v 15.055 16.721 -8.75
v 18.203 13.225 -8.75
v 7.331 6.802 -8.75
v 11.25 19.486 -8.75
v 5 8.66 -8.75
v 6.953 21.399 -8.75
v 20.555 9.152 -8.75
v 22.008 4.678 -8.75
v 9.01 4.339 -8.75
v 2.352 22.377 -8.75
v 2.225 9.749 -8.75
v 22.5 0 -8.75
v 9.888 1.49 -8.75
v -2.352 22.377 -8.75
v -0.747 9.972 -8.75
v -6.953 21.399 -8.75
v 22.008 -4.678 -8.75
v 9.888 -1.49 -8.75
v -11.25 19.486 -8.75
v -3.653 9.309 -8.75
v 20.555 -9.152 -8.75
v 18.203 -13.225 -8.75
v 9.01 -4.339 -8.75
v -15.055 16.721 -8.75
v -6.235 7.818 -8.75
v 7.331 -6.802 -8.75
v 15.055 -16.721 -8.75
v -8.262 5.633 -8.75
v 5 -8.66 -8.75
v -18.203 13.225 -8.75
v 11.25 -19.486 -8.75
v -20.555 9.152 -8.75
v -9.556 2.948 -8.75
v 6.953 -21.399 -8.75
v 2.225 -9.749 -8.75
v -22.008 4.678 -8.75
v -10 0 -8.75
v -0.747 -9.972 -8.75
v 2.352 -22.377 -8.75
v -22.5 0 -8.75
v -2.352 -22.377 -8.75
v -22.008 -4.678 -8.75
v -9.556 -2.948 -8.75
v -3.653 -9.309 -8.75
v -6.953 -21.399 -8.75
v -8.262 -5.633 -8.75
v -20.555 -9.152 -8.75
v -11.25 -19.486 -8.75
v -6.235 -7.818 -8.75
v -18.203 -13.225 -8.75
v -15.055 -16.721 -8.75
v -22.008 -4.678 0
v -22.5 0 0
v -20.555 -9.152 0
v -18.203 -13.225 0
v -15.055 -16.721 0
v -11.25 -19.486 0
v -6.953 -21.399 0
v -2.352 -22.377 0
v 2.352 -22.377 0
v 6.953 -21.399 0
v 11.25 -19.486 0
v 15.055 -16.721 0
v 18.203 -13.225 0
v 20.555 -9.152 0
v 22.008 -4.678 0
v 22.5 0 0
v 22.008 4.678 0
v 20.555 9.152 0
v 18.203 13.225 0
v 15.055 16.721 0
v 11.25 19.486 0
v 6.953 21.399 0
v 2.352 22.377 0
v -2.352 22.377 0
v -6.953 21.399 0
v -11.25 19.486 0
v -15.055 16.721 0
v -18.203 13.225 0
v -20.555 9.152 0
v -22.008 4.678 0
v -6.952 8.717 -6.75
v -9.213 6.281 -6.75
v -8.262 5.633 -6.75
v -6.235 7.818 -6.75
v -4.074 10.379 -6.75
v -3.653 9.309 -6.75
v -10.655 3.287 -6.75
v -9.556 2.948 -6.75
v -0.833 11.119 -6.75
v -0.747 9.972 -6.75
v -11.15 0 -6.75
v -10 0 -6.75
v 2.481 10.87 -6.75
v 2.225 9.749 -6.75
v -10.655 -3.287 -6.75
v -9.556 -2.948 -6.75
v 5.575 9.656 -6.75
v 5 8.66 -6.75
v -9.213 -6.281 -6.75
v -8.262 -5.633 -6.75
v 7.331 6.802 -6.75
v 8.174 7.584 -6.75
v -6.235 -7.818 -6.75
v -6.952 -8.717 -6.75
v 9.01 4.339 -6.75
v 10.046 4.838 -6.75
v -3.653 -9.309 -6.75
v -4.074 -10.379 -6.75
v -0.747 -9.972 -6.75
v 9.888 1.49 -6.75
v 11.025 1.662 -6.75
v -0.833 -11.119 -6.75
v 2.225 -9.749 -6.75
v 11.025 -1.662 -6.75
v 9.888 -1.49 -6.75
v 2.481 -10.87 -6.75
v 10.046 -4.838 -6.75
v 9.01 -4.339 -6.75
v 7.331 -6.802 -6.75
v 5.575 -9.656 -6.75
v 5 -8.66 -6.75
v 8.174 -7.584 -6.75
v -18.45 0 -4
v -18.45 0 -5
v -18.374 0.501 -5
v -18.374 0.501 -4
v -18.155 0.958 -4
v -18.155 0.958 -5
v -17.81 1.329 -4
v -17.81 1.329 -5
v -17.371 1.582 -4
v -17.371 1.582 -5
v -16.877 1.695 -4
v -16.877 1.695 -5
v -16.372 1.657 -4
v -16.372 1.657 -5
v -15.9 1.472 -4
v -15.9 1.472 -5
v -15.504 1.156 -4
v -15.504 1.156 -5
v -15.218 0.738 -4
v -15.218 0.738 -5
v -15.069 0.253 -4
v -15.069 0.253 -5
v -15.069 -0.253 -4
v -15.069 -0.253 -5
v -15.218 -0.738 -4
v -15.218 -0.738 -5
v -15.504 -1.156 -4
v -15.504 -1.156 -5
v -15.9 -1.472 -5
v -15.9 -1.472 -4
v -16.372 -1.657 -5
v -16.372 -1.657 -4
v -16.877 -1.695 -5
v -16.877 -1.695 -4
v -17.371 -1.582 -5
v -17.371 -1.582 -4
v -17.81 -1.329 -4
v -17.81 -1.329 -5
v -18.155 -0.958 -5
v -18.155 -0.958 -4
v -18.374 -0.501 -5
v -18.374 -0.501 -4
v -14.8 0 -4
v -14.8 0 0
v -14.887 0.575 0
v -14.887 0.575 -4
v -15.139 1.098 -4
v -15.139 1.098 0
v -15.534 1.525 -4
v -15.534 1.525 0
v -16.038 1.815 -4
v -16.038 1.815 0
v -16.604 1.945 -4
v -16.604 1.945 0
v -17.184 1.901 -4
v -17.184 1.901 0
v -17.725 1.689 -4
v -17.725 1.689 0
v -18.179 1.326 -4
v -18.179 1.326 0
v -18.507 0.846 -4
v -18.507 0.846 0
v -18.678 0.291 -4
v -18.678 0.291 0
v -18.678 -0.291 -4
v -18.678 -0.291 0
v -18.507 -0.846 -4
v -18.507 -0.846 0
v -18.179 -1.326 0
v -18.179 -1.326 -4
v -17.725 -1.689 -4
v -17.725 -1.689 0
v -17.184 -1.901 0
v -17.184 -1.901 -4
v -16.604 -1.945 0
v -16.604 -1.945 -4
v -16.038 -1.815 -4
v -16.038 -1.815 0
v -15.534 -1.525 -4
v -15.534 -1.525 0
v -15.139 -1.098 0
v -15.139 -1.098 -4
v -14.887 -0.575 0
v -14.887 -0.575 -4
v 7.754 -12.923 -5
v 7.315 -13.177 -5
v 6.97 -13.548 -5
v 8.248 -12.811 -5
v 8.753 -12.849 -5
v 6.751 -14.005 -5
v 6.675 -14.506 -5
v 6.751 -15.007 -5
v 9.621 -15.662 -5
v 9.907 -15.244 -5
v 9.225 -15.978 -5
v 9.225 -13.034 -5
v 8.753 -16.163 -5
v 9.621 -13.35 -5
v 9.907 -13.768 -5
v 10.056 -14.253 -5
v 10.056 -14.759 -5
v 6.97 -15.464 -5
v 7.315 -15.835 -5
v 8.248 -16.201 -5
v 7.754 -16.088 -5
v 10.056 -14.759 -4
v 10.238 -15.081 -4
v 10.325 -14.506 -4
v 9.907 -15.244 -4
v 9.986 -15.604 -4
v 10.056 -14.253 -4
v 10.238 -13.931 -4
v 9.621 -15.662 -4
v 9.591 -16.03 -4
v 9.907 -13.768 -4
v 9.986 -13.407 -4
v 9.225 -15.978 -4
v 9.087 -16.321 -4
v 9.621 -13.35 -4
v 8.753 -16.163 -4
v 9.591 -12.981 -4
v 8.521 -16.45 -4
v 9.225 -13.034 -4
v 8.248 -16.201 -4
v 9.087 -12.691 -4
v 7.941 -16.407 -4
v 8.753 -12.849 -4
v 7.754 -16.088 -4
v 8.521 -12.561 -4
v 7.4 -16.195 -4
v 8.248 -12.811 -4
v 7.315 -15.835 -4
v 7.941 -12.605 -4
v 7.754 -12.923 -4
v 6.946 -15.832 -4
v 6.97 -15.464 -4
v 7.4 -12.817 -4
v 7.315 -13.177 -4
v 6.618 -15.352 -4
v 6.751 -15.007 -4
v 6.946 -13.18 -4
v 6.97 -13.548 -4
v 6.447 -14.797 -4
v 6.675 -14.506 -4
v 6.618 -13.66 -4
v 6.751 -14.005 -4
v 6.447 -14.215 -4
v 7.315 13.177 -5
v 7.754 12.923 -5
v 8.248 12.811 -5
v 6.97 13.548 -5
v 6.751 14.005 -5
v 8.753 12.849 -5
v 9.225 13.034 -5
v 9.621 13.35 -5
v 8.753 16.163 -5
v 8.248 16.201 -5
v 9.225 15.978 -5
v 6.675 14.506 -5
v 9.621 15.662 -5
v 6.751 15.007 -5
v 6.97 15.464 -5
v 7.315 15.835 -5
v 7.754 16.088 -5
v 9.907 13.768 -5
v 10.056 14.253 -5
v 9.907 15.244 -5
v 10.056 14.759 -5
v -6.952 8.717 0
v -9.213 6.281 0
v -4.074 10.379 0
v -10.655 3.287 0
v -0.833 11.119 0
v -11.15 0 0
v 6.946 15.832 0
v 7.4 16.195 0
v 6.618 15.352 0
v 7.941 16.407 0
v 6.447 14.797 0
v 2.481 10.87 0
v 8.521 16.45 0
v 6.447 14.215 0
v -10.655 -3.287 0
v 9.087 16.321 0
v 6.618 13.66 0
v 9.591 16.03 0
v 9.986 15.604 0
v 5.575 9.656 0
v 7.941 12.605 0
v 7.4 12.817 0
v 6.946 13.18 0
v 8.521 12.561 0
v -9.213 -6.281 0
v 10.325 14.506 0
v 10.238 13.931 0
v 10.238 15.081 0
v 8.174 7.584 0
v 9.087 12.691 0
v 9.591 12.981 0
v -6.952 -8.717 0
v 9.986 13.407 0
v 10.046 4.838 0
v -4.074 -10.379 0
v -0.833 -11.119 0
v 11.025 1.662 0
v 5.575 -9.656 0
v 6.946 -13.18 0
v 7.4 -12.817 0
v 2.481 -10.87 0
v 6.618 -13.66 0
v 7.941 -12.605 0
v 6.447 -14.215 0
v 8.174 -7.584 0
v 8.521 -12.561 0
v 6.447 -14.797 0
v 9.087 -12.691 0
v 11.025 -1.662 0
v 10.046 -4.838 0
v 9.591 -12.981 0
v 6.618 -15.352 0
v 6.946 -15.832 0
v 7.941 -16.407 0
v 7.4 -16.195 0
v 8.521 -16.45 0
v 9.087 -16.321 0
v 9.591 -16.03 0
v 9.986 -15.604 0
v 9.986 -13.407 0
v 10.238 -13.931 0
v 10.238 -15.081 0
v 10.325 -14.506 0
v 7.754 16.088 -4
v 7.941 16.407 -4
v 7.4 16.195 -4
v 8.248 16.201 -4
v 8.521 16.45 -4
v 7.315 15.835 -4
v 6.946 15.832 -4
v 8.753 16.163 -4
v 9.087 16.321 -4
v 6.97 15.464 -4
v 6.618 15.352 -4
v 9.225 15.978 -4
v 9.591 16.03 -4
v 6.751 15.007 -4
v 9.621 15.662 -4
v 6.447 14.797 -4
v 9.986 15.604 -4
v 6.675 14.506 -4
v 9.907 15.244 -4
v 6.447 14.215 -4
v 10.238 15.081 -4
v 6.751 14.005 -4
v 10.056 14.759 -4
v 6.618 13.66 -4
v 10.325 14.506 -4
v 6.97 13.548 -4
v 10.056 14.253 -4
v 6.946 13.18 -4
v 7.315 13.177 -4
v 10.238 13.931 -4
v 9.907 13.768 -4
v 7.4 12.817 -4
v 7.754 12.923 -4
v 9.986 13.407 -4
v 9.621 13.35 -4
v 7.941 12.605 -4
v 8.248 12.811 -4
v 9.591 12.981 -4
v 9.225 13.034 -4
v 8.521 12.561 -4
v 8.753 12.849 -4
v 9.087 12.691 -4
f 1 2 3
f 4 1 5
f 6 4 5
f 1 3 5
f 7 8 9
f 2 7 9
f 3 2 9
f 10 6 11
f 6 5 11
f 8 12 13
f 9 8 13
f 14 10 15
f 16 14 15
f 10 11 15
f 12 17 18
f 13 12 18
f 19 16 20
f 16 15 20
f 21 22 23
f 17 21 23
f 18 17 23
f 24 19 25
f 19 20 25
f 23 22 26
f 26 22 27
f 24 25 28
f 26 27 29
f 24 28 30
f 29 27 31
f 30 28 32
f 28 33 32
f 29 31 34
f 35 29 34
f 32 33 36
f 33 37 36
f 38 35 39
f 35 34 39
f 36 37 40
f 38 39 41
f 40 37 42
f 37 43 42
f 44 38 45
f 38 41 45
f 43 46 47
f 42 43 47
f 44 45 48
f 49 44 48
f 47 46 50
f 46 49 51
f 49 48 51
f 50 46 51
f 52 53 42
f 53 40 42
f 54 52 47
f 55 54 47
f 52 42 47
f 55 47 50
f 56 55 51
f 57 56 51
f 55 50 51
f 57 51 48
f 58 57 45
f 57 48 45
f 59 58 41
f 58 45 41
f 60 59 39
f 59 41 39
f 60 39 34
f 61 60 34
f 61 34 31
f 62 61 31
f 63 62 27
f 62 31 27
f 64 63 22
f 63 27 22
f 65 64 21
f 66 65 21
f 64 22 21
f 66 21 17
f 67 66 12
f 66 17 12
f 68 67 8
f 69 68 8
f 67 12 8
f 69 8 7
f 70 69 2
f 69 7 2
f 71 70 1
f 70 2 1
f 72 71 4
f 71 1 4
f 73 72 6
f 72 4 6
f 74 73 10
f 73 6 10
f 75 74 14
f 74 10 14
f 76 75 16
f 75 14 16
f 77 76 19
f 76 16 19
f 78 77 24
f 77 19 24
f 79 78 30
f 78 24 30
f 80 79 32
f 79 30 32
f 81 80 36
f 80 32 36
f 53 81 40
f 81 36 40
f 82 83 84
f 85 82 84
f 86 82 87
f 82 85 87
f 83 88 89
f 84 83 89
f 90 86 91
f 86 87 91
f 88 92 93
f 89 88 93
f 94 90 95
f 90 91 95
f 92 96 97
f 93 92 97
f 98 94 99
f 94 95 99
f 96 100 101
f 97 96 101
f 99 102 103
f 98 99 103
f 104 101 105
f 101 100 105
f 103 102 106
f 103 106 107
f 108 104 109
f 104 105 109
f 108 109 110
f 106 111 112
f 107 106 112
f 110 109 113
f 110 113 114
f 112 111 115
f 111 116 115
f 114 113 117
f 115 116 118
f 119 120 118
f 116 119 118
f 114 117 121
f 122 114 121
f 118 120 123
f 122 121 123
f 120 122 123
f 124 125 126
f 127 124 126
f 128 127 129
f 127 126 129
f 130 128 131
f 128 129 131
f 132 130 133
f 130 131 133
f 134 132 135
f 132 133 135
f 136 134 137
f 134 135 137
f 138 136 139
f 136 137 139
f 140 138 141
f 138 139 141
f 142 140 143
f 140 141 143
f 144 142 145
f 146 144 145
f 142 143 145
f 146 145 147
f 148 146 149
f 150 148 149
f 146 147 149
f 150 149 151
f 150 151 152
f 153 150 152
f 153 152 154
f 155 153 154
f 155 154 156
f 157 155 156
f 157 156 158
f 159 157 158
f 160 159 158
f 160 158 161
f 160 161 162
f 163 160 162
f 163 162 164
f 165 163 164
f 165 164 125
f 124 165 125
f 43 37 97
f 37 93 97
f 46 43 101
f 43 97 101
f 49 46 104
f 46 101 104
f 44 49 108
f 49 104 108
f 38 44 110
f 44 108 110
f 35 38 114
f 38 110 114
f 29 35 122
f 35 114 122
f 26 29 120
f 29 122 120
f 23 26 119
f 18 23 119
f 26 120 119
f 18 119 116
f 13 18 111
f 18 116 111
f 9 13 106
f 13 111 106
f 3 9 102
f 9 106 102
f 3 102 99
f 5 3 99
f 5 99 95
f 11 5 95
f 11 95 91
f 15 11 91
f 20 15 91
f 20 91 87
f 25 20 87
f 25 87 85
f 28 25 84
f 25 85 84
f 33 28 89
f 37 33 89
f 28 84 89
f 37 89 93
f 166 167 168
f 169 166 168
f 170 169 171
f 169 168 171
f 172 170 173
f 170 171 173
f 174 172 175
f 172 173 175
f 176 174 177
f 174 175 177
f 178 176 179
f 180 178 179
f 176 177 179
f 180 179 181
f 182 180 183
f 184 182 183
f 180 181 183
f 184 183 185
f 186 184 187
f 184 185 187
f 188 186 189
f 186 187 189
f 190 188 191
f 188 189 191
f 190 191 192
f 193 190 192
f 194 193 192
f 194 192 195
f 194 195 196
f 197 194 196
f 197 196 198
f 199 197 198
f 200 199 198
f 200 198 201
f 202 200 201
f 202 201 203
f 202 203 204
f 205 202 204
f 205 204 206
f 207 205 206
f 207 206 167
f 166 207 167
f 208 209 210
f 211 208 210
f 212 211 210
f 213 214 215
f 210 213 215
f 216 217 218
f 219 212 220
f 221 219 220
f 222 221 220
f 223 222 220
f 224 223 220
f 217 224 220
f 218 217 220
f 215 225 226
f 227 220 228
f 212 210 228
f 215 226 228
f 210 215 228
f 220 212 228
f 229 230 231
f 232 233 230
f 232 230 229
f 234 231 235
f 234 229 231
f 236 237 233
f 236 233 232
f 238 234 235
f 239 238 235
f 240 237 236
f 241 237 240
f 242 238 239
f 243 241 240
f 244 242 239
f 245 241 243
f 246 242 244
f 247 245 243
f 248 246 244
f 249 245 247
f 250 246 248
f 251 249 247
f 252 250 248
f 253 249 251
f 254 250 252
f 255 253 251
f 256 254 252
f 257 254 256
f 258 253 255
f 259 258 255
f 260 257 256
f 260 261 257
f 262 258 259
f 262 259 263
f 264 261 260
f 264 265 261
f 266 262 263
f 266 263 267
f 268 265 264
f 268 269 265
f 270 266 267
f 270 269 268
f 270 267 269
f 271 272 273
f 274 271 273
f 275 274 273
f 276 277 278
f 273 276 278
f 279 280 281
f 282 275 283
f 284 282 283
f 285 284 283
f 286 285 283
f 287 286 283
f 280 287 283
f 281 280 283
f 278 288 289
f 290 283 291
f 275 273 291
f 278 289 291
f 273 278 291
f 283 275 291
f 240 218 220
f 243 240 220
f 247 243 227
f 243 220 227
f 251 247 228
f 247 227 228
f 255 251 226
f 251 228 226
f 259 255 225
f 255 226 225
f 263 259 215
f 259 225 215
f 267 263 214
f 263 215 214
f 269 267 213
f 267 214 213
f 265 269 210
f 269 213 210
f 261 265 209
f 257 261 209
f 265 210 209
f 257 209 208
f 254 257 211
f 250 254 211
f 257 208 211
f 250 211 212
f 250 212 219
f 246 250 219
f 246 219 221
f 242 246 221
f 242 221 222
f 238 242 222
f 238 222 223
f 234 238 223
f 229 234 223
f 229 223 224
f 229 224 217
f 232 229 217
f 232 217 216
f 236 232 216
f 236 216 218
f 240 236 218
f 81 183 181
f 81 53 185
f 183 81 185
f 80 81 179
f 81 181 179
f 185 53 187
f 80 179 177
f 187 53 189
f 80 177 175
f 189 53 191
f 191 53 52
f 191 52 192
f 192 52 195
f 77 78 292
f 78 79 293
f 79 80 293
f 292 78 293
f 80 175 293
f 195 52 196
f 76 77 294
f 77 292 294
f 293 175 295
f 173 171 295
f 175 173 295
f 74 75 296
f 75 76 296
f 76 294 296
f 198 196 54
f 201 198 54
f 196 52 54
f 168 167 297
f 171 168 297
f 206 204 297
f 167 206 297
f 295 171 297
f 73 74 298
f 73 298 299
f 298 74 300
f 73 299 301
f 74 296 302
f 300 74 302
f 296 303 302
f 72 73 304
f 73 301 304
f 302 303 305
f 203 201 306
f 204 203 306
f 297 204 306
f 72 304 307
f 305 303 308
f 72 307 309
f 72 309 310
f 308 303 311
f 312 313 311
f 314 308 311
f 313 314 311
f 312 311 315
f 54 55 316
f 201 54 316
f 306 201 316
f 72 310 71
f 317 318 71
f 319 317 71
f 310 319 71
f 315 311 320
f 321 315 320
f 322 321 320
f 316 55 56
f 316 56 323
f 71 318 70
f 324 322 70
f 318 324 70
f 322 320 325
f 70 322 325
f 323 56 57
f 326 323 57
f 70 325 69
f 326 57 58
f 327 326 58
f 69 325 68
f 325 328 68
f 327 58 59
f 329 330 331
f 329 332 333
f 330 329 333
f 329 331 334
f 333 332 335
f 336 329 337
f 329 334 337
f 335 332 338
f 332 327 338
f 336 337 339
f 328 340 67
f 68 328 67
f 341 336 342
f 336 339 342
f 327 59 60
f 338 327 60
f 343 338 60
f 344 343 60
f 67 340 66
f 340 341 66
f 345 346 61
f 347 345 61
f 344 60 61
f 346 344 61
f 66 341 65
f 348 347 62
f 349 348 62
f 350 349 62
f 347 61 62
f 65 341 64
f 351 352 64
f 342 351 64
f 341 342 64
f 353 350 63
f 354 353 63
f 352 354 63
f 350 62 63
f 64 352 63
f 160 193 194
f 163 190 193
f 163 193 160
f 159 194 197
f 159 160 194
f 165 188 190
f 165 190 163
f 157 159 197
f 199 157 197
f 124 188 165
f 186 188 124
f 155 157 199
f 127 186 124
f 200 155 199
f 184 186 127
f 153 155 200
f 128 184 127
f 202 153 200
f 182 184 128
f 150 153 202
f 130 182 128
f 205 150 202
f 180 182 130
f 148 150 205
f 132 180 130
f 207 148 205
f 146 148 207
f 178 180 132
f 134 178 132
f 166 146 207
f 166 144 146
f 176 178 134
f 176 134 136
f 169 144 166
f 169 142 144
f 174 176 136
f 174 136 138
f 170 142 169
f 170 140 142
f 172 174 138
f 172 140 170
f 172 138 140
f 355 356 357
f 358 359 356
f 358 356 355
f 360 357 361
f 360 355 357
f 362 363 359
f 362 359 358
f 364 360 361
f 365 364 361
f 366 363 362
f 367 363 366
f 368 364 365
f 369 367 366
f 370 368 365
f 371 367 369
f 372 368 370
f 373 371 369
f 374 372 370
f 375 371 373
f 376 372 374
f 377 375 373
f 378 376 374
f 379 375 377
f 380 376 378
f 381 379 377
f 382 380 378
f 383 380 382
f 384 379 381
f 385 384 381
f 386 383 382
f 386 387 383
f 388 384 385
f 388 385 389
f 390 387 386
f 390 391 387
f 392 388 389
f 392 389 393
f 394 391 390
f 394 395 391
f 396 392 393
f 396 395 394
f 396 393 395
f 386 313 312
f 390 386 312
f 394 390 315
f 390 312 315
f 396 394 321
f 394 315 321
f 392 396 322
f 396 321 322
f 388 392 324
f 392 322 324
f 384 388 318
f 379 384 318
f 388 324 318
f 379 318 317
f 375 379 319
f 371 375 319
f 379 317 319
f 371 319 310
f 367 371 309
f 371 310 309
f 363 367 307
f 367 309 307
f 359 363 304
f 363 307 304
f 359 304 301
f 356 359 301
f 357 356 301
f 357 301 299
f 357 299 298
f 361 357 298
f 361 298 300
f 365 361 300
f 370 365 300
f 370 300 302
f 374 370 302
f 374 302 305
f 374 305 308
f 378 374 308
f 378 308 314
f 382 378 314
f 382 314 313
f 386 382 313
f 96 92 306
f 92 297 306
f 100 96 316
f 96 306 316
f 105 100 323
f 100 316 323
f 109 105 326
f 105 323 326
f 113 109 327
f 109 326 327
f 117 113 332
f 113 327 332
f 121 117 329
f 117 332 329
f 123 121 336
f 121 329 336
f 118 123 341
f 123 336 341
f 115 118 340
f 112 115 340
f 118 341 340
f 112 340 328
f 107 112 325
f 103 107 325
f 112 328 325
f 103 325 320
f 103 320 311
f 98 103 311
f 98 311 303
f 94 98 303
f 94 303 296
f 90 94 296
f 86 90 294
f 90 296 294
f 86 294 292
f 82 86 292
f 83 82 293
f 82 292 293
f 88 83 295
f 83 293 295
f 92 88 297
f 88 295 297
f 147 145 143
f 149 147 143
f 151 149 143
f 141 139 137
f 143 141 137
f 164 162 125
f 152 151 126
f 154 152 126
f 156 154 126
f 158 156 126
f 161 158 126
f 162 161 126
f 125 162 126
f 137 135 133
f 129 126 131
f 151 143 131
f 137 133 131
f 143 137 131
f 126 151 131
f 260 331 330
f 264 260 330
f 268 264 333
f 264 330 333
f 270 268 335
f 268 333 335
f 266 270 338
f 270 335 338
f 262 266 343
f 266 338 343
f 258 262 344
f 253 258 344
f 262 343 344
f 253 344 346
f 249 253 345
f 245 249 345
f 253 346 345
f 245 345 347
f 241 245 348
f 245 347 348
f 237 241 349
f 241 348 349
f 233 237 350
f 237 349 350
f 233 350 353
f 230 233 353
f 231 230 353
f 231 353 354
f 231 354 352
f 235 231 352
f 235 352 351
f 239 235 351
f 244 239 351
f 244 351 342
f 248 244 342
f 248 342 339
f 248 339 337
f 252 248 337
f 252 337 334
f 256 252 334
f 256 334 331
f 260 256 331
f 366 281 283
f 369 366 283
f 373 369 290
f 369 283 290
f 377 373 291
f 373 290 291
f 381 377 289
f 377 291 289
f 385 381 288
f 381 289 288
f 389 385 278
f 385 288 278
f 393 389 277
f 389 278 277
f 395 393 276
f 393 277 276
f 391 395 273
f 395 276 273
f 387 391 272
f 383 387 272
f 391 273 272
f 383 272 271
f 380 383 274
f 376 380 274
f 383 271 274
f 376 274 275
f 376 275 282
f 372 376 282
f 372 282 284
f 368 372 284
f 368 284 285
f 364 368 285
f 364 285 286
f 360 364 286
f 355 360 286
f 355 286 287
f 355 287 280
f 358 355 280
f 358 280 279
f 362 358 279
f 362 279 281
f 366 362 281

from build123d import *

# Parameters (mm, degrees)
HOLE001_D           = 3.4
HOLE001_DEPTH       = 5
HOLE001_CBORE_D     = 3.9
HOLE001_CBORE_DEPTH = 4
POLARPATTERN_COUNT  = 3


with BuildPart() as part:
    # Sketch003 → Revolution (revolve)
    with BuildSketch(Plane.XZ):
        Polygon((-22.5, 0), (-22.5, -8.75), (-10, -8.75), (-10, -6.75), (-11.15, -6.75), (-11.15, 0), align=None)
    revolve(axis=Axis((0, 0, 0), (0, 0, 1)))

    # Hole001
    with Locations(Plane.XY):
        with Locations((-16.75, 0)):
            hole001 = CounterBoreHole(HOLE001_D / 2, HOLE001_CBORE_D / 2, HOLE001_CBORE_DEPTH, depth=HOLE001_DEPTH)

    # PolarPattern: Hole001 ×3 about axis
    polarpattern_axis = Axis((0, 0, 0), (0, 0, 1))
    for i in range(1, POLARPATTERN_COUNT):
        add(hole001.rotate(polarpattern_axis, i * 360 / POLARPATTERN_COUNT), mode=Mode.SUBTRACT)


solid = part.part
